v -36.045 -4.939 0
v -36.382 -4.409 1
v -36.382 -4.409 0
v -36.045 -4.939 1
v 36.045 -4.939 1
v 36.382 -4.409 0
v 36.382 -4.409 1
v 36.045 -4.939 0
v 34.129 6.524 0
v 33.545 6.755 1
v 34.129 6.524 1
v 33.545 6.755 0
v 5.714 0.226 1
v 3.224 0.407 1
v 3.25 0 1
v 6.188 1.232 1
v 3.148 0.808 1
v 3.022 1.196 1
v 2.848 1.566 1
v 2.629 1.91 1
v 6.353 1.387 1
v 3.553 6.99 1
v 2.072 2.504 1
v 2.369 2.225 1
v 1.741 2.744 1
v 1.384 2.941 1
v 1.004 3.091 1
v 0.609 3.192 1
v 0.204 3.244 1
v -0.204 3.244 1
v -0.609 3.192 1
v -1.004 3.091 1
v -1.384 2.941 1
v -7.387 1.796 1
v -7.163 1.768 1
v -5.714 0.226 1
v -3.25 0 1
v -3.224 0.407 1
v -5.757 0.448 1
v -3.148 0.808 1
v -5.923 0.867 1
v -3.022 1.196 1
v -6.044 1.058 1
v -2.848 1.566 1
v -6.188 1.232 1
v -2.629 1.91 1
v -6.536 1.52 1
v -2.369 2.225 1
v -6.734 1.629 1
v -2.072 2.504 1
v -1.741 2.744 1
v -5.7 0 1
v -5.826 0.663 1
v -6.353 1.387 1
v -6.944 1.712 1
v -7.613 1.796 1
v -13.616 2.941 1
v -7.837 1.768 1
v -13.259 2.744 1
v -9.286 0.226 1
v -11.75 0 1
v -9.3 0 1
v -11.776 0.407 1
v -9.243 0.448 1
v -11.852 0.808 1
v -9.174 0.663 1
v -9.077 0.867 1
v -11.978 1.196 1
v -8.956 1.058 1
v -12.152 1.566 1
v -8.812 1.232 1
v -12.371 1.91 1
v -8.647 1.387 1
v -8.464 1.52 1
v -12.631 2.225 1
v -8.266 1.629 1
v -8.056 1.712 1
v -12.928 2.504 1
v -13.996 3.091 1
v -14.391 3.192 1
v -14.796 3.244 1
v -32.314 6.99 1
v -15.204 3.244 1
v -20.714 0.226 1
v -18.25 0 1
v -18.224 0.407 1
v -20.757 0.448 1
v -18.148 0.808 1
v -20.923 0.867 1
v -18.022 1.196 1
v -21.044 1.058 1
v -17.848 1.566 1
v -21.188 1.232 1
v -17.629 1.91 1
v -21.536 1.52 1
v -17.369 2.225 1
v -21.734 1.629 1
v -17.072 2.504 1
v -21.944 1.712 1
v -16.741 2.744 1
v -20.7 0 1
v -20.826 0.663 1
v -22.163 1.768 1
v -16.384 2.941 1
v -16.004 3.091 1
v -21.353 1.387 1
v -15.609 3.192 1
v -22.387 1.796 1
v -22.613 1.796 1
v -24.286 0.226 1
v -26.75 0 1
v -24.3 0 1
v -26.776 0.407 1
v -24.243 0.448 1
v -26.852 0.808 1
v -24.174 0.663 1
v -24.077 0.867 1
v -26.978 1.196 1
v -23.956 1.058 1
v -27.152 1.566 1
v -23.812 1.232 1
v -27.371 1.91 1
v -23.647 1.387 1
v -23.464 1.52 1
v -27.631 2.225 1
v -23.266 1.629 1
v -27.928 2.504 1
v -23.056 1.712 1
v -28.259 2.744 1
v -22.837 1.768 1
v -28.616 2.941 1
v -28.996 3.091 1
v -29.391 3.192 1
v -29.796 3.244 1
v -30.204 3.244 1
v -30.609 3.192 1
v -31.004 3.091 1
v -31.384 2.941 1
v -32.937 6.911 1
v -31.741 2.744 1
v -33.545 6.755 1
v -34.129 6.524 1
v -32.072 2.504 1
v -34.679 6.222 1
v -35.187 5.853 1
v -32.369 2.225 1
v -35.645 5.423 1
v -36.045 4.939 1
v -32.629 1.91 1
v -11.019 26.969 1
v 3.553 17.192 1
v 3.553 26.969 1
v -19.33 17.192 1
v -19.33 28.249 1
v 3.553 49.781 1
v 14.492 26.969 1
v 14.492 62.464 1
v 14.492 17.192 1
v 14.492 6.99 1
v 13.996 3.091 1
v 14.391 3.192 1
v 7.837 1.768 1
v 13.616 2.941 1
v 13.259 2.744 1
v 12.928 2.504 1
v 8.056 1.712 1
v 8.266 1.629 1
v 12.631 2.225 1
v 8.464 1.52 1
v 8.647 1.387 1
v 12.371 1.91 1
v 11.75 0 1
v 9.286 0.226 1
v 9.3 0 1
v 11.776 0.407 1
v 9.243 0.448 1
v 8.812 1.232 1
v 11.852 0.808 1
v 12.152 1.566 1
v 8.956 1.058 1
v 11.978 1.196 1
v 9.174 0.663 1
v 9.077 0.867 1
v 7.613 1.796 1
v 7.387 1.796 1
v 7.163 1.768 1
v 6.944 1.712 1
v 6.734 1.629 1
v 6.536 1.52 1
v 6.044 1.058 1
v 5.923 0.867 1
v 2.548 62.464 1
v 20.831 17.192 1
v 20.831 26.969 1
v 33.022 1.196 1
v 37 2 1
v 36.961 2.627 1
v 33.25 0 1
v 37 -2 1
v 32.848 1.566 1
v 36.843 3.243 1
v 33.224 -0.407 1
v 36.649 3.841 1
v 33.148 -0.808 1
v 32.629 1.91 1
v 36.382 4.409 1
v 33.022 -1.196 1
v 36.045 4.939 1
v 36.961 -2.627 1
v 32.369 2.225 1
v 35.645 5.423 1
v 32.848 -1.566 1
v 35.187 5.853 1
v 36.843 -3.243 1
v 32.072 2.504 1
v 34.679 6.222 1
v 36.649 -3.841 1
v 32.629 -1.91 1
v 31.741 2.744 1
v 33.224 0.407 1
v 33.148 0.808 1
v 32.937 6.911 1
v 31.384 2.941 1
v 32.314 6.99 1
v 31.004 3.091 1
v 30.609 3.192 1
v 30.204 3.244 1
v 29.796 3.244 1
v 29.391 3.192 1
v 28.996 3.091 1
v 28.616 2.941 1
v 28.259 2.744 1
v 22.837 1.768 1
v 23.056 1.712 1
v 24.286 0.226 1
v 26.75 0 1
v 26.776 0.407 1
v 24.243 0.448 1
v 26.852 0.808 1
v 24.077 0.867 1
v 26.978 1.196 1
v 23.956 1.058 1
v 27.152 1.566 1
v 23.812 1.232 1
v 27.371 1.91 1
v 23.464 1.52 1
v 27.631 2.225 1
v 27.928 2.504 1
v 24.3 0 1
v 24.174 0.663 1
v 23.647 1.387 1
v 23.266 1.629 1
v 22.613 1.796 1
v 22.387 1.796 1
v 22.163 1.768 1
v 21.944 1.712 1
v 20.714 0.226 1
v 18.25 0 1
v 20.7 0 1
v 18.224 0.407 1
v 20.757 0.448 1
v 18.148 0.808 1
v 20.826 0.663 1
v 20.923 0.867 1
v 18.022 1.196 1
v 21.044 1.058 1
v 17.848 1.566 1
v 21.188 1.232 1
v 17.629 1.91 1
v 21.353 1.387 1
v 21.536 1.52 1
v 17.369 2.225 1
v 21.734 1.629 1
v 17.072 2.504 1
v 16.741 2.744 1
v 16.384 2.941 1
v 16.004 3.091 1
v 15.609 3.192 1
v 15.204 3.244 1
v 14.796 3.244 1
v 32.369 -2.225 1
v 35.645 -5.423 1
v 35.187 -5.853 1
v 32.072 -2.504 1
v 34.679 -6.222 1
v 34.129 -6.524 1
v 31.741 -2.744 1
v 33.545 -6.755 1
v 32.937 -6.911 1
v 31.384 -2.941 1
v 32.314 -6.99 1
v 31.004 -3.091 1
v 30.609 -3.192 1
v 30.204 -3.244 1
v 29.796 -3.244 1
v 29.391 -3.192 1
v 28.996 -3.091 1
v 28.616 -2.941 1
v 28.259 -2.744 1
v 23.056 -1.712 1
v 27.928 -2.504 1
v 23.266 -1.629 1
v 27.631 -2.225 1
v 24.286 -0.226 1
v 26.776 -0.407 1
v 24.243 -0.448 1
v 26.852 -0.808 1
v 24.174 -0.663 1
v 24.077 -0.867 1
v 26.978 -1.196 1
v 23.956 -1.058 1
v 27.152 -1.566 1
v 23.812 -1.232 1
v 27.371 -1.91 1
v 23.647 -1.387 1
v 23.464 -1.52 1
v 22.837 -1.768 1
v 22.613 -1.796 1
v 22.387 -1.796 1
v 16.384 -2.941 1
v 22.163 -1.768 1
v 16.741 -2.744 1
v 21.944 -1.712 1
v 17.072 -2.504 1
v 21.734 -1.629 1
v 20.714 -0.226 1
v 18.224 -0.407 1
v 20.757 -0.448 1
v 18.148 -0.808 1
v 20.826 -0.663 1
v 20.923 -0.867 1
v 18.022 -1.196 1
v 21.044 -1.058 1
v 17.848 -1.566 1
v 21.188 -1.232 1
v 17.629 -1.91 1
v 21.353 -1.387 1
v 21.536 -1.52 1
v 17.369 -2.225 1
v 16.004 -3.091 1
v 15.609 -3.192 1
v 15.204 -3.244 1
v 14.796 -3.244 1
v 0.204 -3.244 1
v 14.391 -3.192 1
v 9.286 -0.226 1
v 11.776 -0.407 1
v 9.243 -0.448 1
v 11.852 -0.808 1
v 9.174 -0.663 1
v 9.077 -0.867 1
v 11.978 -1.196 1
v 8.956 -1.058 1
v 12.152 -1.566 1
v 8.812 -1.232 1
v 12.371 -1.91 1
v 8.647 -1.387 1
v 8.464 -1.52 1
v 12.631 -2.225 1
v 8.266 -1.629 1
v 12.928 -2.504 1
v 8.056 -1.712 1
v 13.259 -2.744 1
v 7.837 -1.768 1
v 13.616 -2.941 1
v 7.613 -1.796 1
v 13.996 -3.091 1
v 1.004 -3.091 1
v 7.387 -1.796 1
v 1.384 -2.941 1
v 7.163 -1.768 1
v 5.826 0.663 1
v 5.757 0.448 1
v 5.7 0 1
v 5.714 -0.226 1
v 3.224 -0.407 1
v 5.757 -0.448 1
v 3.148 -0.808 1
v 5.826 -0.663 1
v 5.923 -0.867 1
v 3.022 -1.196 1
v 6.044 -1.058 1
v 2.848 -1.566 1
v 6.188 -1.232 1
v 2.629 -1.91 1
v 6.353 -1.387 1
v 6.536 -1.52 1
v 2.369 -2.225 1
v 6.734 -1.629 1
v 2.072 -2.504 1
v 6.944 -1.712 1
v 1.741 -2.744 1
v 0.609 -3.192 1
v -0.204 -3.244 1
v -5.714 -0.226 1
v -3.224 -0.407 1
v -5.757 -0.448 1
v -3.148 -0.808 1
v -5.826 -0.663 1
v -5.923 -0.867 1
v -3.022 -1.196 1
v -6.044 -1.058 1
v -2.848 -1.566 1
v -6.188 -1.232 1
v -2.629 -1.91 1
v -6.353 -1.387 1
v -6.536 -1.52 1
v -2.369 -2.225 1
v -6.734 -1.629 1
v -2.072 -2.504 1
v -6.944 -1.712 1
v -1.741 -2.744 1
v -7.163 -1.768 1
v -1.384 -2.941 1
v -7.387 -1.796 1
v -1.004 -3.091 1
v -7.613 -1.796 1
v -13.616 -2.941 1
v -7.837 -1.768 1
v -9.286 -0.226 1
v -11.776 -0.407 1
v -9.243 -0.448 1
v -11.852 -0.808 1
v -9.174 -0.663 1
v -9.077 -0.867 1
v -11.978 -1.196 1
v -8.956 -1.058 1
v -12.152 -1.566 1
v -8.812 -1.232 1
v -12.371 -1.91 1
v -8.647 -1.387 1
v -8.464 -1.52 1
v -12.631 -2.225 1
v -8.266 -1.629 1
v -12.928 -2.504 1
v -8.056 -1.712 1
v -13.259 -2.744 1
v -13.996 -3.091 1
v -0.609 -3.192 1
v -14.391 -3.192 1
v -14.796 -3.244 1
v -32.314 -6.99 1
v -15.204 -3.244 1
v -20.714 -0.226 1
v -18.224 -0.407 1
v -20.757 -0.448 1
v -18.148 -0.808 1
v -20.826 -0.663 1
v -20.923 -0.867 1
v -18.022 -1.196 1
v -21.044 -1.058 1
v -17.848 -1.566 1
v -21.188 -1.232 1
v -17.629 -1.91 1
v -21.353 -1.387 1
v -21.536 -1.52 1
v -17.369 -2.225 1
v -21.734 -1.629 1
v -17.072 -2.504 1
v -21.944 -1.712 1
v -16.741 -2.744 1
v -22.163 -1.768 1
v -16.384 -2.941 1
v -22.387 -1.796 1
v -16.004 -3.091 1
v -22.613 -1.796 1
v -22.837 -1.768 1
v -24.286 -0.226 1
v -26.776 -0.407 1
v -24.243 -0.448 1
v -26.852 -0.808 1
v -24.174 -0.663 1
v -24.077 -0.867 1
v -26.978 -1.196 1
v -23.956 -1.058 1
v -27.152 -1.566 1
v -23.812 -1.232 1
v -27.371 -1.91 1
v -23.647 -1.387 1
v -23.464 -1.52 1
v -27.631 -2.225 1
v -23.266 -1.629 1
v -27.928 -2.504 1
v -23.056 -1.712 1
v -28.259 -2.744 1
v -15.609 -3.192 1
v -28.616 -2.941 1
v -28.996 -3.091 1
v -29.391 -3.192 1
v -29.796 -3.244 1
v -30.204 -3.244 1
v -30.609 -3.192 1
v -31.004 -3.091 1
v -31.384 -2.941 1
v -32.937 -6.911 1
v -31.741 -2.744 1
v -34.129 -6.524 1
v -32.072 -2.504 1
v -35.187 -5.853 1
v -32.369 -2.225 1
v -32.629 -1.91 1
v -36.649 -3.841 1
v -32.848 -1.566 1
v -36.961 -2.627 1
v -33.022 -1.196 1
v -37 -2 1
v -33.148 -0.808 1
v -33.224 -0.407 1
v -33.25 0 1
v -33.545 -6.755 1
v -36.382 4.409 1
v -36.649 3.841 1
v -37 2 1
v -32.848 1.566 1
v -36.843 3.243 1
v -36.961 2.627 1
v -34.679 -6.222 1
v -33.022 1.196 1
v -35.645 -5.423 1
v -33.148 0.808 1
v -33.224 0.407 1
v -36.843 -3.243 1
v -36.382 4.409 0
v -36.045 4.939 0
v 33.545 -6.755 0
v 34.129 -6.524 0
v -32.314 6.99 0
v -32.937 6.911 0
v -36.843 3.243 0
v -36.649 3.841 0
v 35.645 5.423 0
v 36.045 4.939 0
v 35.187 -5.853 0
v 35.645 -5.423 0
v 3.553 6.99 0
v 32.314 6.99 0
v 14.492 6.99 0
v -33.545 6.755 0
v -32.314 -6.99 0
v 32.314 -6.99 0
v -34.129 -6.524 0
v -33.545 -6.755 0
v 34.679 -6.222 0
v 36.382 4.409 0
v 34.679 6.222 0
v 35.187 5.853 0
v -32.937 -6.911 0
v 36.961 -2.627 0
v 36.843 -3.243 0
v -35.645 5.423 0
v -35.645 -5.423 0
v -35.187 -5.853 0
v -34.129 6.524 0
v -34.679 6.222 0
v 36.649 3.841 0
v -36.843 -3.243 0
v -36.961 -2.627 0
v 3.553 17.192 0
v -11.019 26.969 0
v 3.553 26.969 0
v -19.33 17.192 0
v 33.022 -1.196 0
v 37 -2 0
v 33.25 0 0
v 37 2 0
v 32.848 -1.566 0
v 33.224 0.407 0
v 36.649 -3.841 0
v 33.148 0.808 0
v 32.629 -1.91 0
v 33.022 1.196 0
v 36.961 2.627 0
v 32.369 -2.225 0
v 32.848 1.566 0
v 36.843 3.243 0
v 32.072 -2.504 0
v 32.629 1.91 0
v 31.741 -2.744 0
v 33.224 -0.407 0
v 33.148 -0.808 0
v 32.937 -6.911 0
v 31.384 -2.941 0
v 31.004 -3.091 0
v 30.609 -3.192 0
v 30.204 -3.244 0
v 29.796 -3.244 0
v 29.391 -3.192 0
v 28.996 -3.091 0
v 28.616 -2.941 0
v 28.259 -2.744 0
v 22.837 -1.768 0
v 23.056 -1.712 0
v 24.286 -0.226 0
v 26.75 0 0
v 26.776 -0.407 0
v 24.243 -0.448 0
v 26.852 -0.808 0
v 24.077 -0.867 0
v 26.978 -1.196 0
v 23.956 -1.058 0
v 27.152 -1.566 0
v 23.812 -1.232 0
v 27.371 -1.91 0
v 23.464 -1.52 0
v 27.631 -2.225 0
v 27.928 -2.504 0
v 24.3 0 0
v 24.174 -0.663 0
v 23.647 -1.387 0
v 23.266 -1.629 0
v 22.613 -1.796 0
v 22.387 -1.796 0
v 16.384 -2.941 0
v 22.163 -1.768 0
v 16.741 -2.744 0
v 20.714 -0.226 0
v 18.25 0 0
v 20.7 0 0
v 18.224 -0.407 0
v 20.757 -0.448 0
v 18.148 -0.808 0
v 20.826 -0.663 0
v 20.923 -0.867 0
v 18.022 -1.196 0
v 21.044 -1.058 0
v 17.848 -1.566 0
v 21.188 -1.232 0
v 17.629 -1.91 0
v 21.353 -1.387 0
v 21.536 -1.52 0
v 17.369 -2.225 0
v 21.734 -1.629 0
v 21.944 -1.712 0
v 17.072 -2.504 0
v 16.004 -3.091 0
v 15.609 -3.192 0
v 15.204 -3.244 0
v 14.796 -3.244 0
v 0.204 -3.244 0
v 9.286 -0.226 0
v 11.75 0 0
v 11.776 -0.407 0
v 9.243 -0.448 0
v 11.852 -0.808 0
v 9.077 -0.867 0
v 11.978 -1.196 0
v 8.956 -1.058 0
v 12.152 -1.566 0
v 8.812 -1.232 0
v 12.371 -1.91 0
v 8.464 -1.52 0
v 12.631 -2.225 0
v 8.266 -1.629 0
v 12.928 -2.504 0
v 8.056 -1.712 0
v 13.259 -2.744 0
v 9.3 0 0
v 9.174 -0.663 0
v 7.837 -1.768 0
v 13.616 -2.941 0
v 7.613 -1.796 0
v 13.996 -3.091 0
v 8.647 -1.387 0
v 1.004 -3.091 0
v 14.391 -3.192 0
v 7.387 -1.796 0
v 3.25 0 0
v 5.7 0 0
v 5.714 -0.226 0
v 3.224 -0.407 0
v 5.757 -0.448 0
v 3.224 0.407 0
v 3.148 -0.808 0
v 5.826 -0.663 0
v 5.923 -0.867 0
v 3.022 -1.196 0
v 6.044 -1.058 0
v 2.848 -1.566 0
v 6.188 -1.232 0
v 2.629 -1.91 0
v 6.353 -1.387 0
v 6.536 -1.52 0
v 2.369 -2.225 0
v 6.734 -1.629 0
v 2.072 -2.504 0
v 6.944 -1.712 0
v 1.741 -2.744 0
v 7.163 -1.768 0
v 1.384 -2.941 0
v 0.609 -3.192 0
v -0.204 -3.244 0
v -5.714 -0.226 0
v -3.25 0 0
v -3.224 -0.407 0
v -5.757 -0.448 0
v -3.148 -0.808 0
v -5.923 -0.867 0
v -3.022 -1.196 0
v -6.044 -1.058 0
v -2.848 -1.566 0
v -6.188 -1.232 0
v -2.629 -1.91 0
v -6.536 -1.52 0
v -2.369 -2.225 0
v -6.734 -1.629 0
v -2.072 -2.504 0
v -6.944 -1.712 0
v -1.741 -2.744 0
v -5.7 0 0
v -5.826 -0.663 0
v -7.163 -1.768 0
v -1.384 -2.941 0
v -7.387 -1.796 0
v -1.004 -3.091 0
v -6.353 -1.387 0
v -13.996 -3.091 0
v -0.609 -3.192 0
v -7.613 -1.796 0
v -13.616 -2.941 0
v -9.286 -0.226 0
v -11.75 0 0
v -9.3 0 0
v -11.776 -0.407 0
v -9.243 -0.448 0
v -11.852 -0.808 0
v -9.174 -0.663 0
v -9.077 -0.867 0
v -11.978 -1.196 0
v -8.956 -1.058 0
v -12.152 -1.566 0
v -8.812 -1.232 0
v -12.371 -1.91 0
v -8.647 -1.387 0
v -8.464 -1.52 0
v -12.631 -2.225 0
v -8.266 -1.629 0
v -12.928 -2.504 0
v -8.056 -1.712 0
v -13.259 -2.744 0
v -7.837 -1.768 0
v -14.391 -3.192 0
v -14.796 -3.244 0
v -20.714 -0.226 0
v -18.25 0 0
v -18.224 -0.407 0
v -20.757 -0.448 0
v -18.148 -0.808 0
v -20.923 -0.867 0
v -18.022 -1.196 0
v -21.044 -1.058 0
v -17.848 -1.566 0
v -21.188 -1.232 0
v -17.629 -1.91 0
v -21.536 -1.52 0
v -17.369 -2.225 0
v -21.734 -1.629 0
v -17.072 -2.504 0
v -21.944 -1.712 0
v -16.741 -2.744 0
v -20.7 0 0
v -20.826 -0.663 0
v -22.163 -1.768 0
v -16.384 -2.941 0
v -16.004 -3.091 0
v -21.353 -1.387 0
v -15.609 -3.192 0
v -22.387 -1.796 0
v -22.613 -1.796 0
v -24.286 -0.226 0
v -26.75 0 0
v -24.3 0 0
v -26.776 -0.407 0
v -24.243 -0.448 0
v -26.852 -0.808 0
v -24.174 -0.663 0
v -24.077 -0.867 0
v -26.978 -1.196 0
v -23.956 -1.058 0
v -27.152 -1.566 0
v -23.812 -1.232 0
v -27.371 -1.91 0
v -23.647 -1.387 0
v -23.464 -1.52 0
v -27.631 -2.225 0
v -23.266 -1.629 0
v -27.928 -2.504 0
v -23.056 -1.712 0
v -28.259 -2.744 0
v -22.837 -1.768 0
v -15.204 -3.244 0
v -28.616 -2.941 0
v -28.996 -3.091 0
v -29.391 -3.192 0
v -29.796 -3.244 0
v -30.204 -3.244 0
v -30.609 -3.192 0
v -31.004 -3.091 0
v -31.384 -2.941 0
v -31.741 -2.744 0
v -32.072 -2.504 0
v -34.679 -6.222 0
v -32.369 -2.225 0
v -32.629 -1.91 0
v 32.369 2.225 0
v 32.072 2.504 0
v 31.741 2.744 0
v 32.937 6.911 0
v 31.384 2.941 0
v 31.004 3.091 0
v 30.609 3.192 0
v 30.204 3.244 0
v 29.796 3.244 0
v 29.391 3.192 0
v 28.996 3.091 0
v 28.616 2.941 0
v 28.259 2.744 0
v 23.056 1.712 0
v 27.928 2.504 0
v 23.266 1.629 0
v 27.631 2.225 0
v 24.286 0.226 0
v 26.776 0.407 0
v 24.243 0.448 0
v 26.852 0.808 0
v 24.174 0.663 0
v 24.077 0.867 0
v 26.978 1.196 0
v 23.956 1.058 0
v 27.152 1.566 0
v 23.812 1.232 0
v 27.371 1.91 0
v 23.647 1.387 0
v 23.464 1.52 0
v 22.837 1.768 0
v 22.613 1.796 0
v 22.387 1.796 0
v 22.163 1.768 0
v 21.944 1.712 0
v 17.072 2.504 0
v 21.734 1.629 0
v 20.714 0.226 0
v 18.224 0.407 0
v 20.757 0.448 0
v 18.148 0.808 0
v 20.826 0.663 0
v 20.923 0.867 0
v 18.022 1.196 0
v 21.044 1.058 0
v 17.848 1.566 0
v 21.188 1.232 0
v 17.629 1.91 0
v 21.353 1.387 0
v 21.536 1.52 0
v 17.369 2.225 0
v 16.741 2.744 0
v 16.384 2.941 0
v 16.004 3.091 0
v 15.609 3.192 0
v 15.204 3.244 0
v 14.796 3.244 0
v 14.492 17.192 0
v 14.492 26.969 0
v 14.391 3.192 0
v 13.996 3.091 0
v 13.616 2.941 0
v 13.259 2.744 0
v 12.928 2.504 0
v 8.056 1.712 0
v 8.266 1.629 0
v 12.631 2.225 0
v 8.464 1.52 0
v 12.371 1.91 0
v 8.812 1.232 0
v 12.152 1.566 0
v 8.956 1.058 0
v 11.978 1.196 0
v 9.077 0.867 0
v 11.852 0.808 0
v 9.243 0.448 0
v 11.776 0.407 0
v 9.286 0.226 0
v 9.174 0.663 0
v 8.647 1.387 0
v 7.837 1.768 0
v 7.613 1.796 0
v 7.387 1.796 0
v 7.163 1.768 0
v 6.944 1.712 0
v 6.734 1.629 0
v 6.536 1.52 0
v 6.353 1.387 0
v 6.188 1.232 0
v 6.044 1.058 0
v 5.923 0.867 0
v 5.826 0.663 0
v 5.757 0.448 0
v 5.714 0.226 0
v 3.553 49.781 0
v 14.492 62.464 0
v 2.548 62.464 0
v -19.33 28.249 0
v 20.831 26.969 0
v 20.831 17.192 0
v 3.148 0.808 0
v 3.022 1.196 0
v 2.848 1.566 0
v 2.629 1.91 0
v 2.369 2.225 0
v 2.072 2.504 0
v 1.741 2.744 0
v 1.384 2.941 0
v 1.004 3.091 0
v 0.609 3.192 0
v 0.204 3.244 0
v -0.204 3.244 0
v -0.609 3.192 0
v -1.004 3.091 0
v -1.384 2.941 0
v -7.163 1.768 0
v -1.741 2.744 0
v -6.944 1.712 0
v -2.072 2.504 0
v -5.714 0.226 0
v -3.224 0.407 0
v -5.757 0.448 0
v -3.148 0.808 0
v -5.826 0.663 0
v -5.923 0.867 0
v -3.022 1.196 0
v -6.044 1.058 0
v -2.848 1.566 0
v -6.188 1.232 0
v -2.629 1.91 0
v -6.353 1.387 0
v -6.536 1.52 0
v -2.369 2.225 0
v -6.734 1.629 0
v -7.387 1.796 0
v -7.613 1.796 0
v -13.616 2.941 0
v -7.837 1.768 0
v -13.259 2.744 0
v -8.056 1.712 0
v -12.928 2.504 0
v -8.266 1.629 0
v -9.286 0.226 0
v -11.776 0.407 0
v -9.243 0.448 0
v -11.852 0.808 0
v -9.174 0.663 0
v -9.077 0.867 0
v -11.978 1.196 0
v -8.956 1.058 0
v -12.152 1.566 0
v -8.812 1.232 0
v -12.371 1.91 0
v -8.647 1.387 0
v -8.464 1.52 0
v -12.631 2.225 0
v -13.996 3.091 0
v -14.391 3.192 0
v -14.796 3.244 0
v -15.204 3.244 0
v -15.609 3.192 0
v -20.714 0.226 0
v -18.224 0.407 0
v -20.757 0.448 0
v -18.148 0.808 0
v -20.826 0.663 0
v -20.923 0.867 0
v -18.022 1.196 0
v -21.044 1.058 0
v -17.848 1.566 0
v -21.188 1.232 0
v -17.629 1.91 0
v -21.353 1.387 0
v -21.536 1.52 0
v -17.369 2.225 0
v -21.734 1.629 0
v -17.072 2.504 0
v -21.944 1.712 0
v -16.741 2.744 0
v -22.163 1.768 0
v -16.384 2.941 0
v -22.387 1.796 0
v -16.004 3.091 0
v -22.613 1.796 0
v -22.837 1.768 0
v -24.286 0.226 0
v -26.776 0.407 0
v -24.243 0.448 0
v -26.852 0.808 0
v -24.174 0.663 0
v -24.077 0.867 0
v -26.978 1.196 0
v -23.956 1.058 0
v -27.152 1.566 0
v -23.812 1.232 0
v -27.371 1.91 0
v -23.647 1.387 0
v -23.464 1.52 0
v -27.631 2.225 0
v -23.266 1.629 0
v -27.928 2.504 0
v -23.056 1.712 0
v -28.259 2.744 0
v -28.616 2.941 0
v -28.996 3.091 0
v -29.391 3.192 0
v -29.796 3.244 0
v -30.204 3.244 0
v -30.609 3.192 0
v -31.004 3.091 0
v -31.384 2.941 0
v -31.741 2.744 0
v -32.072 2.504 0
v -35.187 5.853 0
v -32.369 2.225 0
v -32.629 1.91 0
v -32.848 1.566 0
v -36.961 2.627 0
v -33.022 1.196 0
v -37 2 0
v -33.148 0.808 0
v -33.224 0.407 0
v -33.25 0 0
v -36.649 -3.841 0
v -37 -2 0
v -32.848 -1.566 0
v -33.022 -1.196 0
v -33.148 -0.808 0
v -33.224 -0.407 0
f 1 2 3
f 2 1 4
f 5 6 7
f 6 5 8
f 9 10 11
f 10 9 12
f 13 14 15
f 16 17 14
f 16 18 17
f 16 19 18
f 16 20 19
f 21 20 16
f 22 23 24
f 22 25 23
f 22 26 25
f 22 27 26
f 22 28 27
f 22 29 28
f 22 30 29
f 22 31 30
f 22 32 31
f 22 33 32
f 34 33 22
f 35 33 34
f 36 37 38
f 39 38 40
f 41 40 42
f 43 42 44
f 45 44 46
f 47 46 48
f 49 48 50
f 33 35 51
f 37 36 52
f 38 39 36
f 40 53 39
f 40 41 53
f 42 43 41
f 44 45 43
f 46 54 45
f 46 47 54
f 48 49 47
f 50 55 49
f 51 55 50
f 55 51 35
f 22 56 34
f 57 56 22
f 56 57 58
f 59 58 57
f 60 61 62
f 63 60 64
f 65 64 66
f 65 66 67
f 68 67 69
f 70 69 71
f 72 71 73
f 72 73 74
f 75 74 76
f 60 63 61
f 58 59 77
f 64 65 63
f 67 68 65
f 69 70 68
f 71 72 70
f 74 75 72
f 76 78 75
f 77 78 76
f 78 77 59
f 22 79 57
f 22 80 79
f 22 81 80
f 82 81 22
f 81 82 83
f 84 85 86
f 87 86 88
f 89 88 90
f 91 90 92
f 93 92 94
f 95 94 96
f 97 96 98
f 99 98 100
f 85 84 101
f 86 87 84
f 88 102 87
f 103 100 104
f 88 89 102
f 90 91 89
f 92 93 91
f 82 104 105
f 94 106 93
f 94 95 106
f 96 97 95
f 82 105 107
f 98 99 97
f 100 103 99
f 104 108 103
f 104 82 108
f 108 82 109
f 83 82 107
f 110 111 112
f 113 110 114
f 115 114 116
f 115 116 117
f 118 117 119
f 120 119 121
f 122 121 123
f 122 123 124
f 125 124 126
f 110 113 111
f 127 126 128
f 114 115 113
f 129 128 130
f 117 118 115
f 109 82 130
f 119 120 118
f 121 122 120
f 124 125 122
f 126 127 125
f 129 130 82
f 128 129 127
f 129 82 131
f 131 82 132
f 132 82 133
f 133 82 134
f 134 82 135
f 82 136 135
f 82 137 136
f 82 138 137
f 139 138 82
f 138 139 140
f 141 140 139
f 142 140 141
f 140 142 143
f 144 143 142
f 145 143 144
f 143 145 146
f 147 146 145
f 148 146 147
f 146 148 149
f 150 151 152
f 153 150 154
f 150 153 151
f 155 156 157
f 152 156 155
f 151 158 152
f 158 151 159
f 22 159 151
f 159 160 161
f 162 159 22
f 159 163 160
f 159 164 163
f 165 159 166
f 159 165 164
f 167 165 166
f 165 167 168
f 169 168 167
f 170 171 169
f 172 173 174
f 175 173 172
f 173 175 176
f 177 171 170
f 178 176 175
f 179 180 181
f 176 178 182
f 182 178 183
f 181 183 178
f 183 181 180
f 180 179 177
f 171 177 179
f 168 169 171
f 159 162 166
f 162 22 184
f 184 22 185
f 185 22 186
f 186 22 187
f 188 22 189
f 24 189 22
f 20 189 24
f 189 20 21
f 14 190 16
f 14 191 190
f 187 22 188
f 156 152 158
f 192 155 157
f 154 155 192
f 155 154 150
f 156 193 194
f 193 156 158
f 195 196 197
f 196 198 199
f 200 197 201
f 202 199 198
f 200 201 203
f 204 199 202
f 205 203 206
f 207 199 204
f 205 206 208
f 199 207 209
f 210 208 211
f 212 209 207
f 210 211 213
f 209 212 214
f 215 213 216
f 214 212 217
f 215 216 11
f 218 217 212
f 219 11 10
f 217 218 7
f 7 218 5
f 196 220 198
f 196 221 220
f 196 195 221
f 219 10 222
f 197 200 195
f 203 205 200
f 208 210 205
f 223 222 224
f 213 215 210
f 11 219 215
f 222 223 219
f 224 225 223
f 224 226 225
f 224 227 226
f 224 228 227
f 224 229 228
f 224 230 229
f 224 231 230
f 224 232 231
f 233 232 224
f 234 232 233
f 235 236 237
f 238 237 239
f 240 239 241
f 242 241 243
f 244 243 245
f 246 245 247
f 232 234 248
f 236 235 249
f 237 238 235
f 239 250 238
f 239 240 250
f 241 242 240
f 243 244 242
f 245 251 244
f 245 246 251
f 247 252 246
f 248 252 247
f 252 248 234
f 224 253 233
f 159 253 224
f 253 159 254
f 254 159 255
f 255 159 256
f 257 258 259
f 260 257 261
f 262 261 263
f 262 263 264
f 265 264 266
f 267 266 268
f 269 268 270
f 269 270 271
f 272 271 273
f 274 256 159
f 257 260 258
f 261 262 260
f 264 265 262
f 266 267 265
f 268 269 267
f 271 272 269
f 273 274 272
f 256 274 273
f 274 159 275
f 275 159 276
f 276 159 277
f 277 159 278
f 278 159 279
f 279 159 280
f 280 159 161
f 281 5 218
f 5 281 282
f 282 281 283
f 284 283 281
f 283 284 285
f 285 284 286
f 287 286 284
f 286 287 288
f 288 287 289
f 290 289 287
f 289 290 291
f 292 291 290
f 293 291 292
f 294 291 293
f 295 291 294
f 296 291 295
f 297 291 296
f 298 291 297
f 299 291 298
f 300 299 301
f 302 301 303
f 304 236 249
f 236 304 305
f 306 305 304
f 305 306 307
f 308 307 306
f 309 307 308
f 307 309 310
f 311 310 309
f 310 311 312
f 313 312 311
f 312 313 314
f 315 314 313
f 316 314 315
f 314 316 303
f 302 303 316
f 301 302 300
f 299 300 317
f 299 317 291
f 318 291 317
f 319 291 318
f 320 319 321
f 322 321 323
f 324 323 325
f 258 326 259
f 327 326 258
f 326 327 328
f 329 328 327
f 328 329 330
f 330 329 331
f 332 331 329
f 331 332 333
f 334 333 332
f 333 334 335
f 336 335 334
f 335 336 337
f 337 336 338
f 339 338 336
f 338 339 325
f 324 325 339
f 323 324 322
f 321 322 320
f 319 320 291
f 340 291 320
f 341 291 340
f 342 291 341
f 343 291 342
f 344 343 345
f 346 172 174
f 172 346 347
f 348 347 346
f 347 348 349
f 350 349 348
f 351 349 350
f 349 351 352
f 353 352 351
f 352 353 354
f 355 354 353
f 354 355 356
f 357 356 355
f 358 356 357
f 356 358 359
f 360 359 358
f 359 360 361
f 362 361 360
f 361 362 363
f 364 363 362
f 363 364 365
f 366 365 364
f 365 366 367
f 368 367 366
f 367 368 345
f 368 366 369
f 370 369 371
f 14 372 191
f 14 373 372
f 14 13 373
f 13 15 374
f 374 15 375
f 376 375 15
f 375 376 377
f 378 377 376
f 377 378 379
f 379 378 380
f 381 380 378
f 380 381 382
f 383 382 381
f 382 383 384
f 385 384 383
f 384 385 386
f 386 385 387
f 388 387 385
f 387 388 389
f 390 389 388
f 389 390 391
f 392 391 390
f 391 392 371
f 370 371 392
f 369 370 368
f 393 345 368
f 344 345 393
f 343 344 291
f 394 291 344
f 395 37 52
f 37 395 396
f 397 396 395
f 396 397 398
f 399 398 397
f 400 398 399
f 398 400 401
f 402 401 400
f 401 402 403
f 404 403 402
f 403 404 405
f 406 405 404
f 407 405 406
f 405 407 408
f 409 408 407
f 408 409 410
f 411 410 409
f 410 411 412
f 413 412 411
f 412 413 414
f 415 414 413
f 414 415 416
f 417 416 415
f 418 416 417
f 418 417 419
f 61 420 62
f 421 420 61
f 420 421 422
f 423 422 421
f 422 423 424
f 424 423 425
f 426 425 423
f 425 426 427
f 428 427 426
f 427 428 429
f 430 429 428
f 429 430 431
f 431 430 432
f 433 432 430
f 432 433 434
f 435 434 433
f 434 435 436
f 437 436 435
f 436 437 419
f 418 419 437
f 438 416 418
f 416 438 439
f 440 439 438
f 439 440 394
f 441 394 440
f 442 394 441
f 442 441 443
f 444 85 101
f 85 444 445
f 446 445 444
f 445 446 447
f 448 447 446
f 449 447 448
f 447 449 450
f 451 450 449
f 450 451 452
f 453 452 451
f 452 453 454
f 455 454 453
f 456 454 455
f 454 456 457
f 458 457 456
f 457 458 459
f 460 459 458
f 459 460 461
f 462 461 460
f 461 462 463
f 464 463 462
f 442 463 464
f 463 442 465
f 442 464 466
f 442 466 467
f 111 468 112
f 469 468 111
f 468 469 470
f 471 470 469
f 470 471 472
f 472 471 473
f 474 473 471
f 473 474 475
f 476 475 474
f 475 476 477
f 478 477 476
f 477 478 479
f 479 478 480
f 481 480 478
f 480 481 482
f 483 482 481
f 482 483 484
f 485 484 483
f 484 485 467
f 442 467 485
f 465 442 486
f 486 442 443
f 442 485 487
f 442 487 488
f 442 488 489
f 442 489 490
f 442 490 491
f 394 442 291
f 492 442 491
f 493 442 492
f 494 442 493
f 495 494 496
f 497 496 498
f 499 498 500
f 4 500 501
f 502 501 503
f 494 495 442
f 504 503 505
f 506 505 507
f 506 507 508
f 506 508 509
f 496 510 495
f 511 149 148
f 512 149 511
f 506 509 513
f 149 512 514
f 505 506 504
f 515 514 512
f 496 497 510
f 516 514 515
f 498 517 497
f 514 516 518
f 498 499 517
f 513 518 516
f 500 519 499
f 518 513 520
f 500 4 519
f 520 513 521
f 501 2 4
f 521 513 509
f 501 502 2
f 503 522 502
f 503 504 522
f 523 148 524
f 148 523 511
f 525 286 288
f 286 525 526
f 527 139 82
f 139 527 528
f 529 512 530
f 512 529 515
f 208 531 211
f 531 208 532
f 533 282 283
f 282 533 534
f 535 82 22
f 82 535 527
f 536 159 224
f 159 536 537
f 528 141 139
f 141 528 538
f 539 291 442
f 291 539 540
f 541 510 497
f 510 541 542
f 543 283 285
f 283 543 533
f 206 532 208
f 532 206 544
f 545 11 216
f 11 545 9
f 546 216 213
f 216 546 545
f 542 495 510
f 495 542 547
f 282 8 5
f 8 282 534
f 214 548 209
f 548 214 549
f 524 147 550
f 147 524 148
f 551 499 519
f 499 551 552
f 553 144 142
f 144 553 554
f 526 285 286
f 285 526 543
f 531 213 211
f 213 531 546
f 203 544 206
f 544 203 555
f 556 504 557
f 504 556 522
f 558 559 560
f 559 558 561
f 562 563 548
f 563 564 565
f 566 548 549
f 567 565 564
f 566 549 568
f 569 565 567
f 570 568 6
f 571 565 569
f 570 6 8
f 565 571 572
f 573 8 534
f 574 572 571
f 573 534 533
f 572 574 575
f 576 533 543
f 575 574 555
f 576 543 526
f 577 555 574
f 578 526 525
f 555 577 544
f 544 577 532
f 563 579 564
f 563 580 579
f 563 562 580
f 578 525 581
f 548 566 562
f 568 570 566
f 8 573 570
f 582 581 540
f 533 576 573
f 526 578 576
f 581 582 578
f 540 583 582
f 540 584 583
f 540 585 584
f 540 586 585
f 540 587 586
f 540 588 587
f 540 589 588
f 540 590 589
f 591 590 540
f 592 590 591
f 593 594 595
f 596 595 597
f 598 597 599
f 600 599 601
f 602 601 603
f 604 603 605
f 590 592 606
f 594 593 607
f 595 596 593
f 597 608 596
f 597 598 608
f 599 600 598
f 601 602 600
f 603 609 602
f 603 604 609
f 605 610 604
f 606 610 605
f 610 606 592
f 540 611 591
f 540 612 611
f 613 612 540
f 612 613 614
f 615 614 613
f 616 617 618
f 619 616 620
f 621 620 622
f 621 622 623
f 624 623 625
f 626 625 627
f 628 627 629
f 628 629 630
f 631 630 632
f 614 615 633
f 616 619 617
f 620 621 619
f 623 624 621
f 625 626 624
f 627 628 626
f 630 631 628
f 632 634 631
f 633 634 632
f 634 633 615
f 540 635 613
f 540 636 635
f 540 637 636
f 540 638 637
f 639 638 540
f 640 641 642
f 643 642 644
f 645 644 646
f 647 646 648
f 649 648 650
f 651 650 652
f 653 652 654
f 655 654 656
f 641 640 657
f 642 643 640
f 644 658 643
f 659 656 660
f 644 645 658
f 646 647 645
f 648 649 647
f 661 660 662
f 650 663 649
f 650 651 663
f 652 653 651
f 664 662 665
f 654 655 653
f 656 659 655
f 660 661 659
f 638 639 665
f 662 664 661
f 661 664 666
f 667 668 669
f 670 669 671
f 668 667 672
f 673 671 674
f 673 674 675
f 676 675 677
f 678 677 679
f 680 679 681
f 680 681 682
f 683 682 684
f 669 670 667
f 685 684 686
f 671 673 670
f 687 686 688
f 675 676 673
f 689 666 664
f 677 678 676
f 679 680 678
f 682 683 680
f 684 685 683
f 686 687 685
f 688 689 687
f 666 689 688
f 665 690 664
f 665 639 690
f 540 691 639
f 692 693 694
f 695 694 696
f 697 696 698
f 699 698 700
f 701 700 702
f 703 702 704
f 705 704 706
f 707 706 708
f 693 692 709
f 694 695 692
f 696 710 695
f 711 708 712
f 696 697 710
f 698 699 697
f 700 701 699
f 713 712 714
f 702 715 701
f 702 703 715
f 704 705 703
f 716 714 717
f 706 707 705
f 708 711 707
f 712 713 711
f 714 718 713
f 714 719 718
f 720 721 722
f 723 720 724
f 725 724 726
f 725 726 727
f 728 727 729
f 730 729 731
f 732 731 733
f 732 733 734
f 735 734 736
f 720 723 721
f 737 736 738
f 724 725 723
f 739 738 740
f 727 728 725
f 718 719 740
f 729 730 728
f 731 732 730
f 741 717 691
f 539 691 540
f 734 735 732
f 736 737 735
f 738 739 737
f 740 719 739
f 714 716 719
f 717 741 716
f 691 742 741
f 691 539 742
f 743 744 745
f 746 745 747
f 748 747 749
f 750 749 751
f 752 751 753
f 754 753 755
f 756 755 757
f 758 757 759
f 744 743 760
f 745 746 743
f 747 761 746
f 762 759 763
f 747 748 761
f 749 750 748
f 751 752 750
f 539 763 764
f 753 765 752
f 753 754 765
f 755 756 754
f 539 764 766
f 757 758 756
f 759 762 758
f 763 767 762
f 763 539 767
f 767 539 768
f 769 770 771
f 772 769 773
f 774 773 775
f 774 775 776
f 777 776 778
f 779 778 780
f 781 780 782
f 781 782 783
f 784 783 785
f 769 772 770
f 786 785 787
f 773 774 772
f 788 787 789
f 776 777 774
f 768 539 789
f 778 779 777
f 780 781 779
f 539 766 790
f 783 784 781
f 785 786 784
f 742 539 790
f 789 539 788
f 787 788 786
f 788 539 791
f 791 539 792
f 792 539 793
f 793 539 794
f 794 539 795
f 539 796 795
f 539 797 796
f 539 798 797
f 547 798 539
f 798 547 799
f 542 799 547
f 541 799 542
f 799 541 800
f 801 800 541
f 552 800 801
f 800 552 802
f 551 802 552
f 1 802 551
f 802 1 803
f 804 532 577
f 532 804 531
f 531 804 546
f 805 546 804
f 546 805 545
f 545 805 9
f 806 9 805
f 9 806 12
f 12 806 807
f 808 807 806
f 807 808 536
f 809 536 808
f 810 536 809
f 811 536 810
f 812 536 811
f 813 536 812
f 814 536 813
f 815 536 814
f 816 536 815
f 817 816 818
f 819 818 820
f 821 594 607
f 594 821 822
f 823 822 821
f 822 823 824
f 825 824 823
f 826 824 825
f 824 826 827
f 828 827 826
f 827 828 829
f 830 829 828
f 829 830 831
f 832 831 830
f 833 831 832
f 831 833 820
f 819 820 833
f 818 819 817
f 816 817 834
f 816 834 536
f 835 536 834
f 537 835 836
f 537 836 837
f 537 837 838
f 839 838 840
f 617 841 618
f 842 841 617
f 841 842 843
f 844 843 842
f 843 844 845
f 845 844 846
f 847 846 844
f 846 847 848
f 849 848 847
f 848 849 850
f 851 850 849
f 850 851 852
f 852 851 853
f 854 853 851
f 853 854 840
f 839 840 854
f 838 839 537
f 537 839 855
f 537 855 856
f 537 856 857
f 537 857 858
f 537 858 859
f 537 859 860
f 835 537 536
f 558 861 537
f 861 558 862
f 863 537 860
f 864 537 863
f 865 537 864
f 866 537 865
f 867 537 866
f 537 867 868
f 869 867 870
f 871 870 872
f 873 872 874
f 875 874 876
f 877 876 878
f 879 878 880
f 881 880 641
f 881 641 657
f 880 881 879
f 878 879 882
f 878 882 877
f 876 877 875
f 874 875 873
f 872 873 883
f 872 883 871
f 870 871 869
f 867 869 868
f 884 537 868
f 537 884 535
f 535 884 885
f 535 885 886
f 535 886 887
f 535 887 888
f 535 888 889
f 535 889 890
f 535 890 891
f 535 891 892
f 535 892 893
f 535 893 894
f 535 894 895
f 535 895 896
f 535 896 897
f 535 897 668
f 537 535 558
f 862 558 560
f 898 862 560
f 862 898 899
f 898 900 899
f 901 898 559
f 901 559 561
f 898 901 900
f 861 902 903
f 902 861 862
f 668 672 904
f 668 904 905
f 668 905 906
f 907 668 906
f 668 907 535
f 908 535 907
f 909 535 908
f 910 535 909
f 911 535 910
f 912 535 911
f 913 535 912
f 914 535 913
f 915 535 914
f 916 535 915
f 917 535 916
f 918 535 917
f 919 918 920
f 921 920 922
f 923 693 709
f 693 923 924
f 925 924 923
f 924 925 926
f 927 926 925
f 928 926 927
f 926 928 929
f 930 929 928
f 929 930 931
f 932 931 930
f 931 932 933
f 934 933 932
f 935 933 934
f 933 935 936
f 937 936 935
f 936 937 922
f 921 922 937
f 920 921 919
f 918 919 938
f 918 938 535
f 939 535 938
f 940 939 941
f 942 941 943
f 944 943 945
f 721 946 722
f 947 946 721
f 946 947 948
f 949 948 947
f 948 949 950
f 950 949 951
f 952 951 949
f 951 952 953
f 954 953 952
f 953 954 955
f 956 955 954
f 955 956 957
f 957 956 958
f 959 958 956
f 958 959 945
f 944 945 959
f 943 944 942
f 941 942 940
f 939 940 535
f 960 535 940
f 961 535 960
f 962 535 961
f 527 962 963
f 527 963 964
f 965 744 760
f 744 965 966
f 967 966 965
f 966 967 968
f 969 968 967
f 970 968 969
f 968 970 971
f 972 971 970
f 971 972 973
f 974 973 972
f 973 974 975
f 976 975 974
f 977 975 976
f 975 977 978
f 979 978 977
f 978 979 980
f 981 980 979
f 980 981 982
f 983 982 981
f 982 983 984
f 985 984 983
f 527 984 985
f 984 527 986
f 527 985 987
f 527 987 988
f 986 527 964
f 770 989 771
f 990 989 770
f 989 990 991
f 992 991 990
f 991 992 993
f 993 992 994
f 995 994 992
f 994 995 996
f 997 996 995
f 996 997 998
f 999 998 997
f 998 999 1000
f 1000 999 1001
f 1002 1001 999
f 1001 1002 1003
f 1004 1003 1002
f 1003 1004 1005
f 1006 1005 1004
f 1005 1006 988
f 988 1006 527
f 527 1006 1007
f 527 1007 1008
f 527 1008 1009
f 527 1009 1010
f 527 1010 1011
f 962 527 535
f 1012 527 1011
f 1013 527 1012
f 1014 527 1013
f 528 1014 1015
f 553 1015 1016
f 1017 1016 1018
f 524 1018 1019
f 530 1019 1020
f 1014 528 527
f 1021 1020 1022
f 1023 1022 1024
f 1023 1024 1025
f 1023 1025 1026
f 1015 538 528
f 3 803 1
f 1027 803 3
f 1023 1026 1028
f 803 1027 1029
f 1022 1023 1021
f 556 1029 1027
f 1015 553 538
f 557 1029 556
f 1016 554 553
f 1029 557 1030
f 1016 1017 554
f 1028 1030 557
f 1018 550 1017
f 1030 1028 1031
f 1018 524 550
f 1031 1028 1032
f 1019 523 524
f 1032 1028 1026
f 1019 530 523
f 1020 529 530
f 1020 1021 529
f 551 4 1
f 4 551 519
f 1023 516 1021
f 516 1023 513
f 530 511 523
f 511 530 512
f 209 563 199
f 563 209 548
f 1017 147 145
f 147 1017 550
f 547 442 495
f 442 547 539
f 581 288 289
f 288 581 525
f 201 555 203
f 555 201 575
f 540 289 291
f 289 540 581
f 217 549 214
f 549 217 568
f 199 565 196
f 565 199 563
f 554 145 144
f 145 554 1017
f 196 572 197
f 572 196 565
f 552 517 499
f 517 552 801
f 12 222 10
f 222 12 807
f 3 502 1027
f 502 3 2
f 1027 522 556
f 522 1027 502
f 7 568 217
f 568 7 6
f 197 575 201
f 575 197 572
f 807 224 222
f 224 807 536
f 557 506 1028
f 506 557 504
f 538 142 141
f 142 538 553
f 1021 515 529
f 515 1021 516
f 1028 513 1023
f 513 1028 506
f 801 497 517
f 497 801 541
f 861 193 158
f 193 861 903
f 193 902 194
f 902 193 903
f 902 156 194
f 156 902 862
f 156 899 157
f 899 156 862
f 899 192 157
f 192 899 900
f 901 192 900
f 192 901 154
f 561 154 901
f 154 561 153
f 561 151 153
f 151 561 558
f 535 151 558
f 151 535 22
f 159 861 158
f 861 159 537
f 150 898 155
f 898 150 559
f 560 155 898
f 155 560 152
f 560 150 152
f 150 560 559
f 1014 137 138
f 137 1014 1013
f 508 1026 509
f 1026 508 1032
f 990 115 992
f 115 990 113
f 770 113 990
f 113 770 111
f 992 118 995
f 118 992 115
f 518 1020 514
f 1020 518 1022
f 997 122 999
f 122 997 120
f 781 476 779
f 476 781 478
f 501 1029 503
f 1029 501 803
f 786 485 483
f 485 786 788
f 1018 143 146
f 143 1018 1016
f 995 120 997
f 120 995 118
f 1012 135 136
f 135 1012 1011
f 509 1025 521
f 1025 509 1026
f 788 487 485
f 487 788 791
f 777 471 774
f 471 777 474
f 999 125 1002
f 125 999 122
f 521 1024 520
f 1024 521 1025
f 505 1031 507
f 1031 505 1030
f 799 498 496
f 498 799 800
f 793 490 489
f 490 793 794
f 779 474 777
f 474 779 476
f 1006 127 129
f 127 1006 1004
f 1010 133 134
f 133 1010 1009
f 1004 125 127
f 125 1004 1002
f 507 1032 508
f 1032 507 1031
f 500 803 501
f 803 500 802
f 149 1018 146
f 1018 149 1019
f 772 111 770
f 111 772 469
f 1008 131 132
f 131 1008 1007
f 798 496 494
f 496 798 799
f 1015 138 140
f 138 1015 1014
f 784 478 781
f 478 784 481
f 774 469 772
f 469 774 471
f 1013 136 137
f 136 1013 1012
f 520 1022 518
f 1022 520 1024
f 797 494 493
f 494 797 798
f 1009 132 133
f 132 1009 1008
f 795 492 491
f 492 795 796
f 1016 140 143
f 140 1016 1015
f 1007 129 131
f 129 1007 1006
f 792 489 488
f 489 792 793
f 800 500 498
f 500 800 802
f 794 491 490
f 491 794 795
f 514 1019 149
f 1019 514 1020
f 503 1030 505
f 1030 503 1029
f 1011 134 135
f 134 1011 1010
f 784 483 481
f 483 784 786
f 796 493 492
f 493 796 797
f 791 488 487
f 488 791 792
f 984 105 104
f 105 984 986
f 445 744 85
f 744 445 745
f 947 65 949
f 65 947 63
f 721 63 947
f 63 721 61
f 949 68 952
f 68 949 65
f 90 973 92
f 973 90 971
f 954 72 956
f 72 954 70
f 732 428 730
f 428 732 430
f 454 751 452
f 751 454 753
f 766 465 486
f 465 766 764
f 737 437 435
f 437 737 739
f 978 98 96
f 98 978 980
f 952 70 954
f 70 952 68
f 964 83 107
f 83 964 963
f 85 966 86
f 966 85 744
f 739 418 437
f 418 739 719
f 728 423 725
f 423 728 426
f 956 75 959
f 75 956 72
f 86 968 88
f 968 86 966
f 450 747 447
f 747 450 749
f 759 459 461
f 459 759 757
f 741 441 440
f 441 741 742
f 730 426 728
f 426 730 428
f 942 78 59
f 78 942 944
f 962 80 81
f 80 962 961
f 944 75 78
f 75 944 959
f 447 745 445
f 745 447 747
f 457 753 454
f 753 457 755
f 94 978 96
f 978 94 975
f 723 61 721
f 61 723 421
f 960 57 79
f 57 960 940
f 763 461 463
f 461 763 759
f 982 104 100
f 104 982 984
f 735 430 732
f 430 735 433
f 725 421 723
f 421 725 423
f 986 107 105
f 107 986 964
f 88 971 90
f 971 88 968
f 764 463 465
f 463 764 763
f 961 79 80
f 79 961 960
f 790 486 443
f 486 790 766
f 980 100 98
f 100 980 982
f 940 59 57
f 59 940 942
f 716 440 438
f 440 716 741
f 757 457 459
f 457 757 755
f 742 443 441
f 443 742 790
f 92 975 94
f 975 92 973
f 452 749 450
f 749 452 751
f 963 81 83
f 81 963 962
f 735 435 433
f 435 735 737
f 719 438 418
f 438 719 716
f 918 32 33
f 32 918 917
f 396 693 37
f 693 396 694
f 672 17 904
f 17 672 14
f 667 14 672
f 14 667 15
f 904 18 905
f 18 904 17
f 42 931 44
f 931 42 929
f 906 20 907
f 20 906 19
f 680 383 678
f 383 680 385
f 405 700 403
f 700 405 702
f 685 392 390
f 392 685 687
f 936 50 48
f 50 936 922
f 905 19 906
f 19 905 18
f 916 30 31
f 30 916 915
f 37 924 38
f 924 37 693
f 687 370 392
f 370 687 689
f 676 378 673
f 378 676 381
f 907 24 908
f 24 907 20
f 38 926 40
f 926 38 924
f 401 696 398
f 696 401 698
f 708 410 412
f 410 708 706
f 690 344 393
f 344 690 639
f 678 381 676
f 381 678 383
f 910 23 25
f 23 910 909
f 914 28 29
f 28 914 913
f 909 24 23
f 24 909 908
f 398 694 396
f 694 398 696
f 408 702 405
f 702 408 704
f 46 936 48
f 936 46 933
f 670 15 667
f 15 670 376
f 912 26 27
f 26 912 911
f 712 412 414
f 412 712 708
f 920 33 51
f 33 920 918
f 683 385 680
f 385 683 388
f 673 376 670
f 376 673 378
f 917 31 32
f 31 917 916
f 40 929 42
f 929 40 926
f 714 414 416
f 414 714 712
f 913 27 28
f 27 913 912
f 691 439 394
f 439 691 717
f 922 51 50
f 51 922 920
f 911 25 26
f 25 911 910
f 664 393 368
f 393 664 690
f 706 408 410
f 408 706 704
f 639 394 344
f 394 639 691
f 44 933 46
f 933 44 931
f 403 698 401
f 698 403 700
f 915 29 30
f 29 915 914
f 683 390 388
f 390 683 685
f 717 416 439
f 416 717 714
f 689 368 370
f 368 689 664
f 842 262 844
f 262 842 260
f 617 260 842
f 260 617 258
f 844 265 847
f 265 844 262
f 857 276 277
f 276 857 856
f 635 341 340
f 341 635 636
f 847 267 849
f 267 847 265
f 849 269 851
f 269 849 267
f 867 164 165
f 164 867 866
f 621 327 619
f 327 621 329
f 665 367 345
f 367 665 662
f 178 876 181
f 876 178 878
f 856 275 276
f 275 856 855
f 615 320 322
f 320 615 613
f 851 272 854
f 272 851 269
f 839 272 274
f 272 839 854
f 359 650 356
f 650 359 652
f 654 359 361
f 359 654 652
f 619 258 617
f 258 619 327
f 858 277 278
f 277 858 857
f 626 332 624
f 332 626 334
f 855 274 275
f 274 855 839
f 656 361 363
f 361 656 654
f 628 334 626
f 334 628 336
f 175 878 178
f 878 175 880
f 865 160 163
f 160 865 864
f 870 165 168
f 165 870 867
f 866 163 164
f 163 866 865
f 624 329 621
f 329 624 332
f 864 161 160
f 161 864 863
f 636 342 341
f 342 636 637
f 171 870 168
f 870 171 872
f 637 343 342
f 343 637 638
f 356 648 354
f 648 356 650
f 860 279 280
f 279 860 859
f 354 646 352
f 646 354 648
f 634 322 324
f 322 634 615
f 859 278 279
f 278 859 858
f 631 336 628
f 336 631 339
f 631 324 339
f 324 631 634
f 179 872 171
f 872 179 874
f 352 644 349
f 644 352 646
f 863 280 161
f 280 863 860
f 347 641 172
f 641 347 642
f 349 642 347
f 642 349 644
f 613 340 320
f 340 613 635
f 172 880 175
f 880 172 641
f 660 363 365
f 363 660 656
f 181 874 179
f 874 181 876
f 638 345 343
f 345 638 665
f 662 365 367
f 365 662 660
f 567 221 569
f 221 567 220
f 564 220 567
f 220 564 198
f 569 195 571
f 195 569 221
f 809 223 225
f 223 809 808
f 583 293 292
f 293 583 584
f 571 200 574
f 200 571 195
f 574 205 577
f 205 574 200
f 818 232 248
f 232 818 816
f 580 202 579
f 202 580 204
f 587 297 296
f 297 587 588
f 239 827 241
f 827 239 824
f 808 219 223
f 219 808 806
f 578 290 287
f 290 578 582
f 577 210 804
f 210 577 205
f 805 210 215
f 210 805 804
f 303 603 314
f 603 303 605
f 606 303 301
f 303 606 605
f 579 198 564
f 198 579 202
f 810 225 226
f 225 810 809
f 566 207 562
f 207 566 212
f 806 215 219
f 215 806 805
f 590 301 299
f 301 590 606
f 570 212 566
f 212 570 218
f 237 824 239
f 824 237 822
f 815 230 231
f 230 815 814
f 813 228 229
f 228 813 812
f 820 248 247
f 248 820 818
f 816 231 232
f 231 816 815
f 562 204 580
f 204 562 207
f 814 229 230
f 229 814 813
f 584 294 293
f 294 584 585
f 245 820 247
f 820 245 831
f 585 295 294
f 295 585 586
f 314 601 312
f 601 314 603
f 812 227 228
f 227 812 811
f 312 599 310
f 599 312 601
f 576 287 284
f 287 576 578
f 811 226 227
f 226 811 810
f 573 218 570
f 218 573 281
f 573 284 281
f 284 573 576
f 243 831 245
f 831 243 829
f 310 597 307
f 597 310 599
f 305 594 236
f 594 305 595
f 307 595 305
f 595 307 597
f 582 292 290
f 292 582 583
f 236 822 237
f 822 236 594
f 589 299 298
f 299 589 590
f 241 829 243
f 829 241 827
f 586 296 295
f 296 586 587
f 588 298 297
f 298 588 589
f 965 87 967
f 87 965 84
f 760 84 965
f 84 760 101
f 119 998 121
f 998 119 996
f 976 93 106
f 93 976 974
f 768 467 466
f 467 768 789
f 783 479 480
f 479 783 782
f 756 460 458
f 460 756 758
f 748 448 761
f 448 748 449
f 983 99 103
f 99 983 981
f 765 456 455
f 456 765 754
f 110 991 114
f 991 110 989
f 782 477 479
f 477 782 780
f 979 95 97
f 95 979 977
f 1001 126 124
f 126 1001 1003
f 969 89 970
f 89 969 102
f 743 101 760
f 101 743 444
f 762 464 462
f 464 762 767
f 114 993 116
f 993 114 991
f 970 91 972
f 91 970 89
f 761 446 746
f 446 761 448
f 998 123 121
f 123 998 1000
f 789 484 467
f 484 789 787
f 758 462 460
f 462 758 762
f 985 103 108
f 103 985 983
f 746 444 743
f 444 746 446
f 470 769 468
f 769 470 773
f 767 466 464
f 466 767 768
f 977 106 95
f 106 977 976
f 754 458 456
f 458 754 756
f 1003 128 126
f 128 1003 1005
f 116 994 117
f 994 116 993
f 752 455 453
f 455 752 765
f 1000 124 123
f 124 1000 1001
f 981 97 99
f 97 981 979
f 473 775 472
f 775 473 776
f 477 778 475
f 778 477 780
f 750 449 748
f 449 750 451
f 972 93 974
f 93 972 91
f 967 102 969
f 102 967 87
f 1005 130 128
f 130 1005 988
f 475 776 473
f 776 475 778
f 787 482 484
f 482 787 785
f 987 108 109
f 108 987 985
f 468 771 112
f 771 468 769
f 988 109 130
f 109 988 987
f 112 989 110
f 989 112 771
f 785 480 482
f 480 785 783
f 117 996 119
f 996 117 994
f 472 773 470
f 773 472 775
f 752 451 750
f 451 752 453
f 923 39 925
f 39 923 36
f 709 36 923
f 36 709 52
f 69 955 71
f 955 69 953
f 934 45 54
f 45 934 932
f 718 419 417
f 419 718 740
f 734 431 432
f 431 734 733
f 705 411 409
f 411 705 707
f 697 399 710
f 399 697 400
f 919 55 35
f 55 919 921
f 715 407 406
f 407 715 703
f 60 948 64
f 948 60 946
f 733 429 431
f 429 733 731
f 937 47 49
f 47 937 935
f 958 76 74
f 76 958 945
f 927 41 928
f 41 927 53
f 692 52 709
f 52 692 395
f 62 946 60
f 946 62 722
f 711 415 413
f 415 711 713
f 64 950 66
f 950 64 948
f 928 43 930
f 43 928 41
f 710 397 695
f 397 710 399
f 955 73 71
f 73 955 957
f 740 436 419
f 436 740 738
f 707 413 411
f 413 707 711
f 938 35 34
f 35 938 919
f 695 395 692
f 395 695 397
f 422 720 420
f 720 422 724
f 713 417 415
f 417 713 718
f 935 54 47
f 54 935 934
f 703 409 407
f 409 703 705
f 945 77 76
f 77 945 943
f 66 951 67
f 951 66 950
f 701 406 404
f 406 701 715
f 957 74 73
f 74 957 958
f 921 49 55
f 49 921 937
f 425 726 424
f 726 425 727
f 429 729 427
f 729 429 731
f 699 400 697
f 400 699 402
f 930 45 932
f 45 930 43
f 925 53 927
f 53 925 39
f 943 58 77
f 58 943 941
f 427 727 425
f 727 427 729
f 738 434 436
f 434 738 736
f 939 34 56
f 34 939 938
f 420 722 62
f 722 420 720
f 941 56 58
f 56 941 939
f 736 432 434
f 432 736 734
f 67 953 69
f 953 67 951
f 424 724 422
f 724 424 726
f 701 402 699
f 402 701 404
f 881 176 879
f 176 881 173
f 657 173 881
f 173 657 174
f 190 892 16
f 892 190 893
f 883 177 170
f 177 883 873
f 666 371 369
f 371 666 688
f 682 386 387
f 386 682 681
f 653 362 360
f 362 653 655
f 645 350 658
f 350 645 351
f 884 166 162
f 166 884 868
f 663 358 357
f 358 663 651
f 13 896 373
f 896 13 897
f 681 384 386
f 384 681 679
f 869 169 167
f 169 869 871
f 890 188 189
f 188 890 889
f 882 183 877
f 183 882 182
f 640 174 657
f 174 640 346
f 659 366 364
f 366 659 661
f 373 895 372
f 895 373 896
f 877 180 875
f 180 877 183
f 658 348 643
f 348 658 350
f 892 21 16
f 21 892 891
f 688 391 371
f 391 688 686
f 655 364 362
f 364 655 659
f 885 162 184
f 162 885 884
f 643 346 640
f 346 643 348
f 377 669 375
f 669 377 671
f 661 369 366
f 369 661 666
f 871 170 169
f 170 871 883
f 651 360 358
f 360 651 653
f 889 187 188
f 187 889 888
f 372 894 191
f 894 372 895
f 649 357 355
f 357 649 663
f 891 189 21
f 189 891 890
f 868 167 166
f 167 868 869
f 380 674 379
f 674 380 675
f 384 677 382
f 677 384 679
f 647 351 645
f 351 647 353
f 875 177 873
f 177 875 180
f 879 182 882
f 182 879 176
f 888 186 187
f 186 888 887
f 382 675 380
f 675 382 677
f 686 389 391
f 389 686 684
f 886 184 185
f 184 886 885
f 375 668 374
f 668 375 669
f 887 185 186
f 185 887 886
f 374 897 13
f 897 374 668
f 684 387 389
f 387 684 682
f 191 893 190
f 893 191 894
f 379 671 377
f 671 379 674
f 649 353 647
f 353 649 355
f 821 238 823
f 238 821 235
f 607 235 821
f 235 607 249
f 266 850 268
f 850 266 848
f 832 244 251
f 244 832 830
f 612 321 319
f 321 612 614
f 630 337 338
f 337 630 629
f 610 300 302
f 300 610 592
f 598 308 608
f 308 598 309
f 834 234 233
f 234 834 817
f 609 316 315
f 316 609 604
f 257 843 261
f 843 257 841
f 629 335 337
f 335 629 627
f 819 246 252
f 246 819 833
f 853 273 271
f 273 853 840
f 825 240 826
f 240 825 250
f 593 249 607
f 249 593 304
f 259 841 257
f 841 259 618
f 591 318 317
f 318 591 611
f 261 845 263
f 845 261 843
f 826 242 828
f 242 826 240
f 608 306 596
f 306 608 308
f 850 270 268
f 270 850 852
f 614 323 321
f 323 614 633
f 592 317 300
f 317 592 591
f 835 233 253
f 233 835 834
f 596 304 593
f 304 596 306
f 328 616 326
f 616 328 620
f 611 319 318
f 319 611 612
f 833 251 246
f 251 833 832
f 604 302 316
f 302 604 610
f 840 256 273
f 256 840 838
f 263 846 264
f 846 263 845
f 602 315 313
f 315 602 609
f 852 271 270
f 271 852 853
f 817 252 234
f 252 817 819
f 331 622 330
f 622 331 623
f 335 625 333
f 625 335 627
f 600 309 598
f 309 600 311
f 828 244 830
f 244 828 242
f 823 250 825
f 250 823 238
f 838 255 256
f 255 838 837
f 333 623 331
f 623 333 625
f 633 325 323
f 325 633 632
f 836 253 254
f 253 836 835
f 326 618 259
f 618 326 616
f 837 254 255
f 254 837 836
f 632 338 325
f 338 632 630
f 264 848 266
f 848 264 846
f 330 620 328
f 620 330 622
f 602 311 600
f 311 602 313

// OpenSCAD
$fn = 50;


difference() {
	union() {
		hull() {
			translate(v = [-32.0000000000, 2.0000000000, 0]) {
				cylinder(h = 1, r = 5);
			}
			translate(v = [32.0000000000, 2.0000000000, 0]) {
				cylinder(h = 1, r = 5);
			}
			translate(v = [-32.0000000000, -2.0000000000, 0]) {
				cylinder(h = 1, r = 5);
			}
			translate(v = [32.0000000000, -2.0000000000, 0]) {
				cylinder(h = 1, r = 5);
			}
		}
		translate(v = [0, 61.1111111111, 0]) {
			linear_extrude(height = 1) {
				text(font = "DejaVu Sans Mono:style=Bold", halign = "center", size = 57.0000000000, text = "4", valign = "top");
			}
		}
	}
	union() {
		translate(v = [-30.0000000000, 0.0000000000, 0]) {
			translate(v = [0, 0, -100]) {
				cylinder(h = 200, r = 3.2500000000);
			}
		}
		translate(v = [-15.0000000000, 0.0000000000, 0]) {
			translate(v = [0, 0, -100]) {
				cylinder(h = 200, r = 3.2500000000);
			}
		}
		translate(v = [0, 0, -100]) {
			cylinder(h = 200, r = 3.2500000000);
		}
		translate(v = [15.0000000000, 0.0000000000, 0]) {
			translate(v = [0, 0, -100]) {
				cylinder(h = 200, r = 3.2500000000);
			}
		}
		translate(v = [30.0000000000, 0.0000000000, 0]) {
			translate(v = [0, 0, -100]) {
				cylinder(h = 200, r = 3.2500000000);
			}
		}
		translate(v = [-30.0000000000, 0.0000000000, 0]) {
			translate(v = [0, 0, -100]) {
				cylinder(h = 200, r = 1.8000000000);
			}
		}
		translate(v = [-22.5000000000, 0.0000000000, 0]) {
			translate(v = [0, 0, -100]) {
				cylinder(h = 200, r = 1.8000000000);
			}
		}
		translate(v = [-15.0000000000, 0.0000000000, 0]) {
			translate(v = [0, 0, -100]) {
				cylinder(h = 200, r = 1.8000000000);
			}
		}
		translate(v = [-7.5000000000, 0.0000000000, 0]) {
			translate(v = [0, 0, -100]) {
				cylinder(h = 200, r = 1.8000000000);
			}
		}
		translate(v = [0, 0, -100]) {
			cylinder(h = 200, r = 1.8000000000);
		}
		translate(v = [7.5000000000, 0.0000000000, 0]) {
			translate(v = [0, 0, -100]) {
				cylinder(h = 200, r = 1.8000000000);
			}
		}
		translate(v = [15.0000000000, 0.0000000000, 0]) {
			translate(v = [0, 0, -100]) {
				cylinder(h = 200, r = 1.8000000000);
			}
		}
		translate(v = [22.5000000000, 0.0000000000, 0]) {
			translate(v = [0, 0, -100]) {
				cylinder(h = 200, r = 1.8000000000);
			}
		}
		translate(v = [30.0000000000, 0.0000000000, 0]) {
			translate(v = [0, 0, -100]) {
				cylinder(h = 200, r = 1.8000000000);
			}
		}
	}
}
